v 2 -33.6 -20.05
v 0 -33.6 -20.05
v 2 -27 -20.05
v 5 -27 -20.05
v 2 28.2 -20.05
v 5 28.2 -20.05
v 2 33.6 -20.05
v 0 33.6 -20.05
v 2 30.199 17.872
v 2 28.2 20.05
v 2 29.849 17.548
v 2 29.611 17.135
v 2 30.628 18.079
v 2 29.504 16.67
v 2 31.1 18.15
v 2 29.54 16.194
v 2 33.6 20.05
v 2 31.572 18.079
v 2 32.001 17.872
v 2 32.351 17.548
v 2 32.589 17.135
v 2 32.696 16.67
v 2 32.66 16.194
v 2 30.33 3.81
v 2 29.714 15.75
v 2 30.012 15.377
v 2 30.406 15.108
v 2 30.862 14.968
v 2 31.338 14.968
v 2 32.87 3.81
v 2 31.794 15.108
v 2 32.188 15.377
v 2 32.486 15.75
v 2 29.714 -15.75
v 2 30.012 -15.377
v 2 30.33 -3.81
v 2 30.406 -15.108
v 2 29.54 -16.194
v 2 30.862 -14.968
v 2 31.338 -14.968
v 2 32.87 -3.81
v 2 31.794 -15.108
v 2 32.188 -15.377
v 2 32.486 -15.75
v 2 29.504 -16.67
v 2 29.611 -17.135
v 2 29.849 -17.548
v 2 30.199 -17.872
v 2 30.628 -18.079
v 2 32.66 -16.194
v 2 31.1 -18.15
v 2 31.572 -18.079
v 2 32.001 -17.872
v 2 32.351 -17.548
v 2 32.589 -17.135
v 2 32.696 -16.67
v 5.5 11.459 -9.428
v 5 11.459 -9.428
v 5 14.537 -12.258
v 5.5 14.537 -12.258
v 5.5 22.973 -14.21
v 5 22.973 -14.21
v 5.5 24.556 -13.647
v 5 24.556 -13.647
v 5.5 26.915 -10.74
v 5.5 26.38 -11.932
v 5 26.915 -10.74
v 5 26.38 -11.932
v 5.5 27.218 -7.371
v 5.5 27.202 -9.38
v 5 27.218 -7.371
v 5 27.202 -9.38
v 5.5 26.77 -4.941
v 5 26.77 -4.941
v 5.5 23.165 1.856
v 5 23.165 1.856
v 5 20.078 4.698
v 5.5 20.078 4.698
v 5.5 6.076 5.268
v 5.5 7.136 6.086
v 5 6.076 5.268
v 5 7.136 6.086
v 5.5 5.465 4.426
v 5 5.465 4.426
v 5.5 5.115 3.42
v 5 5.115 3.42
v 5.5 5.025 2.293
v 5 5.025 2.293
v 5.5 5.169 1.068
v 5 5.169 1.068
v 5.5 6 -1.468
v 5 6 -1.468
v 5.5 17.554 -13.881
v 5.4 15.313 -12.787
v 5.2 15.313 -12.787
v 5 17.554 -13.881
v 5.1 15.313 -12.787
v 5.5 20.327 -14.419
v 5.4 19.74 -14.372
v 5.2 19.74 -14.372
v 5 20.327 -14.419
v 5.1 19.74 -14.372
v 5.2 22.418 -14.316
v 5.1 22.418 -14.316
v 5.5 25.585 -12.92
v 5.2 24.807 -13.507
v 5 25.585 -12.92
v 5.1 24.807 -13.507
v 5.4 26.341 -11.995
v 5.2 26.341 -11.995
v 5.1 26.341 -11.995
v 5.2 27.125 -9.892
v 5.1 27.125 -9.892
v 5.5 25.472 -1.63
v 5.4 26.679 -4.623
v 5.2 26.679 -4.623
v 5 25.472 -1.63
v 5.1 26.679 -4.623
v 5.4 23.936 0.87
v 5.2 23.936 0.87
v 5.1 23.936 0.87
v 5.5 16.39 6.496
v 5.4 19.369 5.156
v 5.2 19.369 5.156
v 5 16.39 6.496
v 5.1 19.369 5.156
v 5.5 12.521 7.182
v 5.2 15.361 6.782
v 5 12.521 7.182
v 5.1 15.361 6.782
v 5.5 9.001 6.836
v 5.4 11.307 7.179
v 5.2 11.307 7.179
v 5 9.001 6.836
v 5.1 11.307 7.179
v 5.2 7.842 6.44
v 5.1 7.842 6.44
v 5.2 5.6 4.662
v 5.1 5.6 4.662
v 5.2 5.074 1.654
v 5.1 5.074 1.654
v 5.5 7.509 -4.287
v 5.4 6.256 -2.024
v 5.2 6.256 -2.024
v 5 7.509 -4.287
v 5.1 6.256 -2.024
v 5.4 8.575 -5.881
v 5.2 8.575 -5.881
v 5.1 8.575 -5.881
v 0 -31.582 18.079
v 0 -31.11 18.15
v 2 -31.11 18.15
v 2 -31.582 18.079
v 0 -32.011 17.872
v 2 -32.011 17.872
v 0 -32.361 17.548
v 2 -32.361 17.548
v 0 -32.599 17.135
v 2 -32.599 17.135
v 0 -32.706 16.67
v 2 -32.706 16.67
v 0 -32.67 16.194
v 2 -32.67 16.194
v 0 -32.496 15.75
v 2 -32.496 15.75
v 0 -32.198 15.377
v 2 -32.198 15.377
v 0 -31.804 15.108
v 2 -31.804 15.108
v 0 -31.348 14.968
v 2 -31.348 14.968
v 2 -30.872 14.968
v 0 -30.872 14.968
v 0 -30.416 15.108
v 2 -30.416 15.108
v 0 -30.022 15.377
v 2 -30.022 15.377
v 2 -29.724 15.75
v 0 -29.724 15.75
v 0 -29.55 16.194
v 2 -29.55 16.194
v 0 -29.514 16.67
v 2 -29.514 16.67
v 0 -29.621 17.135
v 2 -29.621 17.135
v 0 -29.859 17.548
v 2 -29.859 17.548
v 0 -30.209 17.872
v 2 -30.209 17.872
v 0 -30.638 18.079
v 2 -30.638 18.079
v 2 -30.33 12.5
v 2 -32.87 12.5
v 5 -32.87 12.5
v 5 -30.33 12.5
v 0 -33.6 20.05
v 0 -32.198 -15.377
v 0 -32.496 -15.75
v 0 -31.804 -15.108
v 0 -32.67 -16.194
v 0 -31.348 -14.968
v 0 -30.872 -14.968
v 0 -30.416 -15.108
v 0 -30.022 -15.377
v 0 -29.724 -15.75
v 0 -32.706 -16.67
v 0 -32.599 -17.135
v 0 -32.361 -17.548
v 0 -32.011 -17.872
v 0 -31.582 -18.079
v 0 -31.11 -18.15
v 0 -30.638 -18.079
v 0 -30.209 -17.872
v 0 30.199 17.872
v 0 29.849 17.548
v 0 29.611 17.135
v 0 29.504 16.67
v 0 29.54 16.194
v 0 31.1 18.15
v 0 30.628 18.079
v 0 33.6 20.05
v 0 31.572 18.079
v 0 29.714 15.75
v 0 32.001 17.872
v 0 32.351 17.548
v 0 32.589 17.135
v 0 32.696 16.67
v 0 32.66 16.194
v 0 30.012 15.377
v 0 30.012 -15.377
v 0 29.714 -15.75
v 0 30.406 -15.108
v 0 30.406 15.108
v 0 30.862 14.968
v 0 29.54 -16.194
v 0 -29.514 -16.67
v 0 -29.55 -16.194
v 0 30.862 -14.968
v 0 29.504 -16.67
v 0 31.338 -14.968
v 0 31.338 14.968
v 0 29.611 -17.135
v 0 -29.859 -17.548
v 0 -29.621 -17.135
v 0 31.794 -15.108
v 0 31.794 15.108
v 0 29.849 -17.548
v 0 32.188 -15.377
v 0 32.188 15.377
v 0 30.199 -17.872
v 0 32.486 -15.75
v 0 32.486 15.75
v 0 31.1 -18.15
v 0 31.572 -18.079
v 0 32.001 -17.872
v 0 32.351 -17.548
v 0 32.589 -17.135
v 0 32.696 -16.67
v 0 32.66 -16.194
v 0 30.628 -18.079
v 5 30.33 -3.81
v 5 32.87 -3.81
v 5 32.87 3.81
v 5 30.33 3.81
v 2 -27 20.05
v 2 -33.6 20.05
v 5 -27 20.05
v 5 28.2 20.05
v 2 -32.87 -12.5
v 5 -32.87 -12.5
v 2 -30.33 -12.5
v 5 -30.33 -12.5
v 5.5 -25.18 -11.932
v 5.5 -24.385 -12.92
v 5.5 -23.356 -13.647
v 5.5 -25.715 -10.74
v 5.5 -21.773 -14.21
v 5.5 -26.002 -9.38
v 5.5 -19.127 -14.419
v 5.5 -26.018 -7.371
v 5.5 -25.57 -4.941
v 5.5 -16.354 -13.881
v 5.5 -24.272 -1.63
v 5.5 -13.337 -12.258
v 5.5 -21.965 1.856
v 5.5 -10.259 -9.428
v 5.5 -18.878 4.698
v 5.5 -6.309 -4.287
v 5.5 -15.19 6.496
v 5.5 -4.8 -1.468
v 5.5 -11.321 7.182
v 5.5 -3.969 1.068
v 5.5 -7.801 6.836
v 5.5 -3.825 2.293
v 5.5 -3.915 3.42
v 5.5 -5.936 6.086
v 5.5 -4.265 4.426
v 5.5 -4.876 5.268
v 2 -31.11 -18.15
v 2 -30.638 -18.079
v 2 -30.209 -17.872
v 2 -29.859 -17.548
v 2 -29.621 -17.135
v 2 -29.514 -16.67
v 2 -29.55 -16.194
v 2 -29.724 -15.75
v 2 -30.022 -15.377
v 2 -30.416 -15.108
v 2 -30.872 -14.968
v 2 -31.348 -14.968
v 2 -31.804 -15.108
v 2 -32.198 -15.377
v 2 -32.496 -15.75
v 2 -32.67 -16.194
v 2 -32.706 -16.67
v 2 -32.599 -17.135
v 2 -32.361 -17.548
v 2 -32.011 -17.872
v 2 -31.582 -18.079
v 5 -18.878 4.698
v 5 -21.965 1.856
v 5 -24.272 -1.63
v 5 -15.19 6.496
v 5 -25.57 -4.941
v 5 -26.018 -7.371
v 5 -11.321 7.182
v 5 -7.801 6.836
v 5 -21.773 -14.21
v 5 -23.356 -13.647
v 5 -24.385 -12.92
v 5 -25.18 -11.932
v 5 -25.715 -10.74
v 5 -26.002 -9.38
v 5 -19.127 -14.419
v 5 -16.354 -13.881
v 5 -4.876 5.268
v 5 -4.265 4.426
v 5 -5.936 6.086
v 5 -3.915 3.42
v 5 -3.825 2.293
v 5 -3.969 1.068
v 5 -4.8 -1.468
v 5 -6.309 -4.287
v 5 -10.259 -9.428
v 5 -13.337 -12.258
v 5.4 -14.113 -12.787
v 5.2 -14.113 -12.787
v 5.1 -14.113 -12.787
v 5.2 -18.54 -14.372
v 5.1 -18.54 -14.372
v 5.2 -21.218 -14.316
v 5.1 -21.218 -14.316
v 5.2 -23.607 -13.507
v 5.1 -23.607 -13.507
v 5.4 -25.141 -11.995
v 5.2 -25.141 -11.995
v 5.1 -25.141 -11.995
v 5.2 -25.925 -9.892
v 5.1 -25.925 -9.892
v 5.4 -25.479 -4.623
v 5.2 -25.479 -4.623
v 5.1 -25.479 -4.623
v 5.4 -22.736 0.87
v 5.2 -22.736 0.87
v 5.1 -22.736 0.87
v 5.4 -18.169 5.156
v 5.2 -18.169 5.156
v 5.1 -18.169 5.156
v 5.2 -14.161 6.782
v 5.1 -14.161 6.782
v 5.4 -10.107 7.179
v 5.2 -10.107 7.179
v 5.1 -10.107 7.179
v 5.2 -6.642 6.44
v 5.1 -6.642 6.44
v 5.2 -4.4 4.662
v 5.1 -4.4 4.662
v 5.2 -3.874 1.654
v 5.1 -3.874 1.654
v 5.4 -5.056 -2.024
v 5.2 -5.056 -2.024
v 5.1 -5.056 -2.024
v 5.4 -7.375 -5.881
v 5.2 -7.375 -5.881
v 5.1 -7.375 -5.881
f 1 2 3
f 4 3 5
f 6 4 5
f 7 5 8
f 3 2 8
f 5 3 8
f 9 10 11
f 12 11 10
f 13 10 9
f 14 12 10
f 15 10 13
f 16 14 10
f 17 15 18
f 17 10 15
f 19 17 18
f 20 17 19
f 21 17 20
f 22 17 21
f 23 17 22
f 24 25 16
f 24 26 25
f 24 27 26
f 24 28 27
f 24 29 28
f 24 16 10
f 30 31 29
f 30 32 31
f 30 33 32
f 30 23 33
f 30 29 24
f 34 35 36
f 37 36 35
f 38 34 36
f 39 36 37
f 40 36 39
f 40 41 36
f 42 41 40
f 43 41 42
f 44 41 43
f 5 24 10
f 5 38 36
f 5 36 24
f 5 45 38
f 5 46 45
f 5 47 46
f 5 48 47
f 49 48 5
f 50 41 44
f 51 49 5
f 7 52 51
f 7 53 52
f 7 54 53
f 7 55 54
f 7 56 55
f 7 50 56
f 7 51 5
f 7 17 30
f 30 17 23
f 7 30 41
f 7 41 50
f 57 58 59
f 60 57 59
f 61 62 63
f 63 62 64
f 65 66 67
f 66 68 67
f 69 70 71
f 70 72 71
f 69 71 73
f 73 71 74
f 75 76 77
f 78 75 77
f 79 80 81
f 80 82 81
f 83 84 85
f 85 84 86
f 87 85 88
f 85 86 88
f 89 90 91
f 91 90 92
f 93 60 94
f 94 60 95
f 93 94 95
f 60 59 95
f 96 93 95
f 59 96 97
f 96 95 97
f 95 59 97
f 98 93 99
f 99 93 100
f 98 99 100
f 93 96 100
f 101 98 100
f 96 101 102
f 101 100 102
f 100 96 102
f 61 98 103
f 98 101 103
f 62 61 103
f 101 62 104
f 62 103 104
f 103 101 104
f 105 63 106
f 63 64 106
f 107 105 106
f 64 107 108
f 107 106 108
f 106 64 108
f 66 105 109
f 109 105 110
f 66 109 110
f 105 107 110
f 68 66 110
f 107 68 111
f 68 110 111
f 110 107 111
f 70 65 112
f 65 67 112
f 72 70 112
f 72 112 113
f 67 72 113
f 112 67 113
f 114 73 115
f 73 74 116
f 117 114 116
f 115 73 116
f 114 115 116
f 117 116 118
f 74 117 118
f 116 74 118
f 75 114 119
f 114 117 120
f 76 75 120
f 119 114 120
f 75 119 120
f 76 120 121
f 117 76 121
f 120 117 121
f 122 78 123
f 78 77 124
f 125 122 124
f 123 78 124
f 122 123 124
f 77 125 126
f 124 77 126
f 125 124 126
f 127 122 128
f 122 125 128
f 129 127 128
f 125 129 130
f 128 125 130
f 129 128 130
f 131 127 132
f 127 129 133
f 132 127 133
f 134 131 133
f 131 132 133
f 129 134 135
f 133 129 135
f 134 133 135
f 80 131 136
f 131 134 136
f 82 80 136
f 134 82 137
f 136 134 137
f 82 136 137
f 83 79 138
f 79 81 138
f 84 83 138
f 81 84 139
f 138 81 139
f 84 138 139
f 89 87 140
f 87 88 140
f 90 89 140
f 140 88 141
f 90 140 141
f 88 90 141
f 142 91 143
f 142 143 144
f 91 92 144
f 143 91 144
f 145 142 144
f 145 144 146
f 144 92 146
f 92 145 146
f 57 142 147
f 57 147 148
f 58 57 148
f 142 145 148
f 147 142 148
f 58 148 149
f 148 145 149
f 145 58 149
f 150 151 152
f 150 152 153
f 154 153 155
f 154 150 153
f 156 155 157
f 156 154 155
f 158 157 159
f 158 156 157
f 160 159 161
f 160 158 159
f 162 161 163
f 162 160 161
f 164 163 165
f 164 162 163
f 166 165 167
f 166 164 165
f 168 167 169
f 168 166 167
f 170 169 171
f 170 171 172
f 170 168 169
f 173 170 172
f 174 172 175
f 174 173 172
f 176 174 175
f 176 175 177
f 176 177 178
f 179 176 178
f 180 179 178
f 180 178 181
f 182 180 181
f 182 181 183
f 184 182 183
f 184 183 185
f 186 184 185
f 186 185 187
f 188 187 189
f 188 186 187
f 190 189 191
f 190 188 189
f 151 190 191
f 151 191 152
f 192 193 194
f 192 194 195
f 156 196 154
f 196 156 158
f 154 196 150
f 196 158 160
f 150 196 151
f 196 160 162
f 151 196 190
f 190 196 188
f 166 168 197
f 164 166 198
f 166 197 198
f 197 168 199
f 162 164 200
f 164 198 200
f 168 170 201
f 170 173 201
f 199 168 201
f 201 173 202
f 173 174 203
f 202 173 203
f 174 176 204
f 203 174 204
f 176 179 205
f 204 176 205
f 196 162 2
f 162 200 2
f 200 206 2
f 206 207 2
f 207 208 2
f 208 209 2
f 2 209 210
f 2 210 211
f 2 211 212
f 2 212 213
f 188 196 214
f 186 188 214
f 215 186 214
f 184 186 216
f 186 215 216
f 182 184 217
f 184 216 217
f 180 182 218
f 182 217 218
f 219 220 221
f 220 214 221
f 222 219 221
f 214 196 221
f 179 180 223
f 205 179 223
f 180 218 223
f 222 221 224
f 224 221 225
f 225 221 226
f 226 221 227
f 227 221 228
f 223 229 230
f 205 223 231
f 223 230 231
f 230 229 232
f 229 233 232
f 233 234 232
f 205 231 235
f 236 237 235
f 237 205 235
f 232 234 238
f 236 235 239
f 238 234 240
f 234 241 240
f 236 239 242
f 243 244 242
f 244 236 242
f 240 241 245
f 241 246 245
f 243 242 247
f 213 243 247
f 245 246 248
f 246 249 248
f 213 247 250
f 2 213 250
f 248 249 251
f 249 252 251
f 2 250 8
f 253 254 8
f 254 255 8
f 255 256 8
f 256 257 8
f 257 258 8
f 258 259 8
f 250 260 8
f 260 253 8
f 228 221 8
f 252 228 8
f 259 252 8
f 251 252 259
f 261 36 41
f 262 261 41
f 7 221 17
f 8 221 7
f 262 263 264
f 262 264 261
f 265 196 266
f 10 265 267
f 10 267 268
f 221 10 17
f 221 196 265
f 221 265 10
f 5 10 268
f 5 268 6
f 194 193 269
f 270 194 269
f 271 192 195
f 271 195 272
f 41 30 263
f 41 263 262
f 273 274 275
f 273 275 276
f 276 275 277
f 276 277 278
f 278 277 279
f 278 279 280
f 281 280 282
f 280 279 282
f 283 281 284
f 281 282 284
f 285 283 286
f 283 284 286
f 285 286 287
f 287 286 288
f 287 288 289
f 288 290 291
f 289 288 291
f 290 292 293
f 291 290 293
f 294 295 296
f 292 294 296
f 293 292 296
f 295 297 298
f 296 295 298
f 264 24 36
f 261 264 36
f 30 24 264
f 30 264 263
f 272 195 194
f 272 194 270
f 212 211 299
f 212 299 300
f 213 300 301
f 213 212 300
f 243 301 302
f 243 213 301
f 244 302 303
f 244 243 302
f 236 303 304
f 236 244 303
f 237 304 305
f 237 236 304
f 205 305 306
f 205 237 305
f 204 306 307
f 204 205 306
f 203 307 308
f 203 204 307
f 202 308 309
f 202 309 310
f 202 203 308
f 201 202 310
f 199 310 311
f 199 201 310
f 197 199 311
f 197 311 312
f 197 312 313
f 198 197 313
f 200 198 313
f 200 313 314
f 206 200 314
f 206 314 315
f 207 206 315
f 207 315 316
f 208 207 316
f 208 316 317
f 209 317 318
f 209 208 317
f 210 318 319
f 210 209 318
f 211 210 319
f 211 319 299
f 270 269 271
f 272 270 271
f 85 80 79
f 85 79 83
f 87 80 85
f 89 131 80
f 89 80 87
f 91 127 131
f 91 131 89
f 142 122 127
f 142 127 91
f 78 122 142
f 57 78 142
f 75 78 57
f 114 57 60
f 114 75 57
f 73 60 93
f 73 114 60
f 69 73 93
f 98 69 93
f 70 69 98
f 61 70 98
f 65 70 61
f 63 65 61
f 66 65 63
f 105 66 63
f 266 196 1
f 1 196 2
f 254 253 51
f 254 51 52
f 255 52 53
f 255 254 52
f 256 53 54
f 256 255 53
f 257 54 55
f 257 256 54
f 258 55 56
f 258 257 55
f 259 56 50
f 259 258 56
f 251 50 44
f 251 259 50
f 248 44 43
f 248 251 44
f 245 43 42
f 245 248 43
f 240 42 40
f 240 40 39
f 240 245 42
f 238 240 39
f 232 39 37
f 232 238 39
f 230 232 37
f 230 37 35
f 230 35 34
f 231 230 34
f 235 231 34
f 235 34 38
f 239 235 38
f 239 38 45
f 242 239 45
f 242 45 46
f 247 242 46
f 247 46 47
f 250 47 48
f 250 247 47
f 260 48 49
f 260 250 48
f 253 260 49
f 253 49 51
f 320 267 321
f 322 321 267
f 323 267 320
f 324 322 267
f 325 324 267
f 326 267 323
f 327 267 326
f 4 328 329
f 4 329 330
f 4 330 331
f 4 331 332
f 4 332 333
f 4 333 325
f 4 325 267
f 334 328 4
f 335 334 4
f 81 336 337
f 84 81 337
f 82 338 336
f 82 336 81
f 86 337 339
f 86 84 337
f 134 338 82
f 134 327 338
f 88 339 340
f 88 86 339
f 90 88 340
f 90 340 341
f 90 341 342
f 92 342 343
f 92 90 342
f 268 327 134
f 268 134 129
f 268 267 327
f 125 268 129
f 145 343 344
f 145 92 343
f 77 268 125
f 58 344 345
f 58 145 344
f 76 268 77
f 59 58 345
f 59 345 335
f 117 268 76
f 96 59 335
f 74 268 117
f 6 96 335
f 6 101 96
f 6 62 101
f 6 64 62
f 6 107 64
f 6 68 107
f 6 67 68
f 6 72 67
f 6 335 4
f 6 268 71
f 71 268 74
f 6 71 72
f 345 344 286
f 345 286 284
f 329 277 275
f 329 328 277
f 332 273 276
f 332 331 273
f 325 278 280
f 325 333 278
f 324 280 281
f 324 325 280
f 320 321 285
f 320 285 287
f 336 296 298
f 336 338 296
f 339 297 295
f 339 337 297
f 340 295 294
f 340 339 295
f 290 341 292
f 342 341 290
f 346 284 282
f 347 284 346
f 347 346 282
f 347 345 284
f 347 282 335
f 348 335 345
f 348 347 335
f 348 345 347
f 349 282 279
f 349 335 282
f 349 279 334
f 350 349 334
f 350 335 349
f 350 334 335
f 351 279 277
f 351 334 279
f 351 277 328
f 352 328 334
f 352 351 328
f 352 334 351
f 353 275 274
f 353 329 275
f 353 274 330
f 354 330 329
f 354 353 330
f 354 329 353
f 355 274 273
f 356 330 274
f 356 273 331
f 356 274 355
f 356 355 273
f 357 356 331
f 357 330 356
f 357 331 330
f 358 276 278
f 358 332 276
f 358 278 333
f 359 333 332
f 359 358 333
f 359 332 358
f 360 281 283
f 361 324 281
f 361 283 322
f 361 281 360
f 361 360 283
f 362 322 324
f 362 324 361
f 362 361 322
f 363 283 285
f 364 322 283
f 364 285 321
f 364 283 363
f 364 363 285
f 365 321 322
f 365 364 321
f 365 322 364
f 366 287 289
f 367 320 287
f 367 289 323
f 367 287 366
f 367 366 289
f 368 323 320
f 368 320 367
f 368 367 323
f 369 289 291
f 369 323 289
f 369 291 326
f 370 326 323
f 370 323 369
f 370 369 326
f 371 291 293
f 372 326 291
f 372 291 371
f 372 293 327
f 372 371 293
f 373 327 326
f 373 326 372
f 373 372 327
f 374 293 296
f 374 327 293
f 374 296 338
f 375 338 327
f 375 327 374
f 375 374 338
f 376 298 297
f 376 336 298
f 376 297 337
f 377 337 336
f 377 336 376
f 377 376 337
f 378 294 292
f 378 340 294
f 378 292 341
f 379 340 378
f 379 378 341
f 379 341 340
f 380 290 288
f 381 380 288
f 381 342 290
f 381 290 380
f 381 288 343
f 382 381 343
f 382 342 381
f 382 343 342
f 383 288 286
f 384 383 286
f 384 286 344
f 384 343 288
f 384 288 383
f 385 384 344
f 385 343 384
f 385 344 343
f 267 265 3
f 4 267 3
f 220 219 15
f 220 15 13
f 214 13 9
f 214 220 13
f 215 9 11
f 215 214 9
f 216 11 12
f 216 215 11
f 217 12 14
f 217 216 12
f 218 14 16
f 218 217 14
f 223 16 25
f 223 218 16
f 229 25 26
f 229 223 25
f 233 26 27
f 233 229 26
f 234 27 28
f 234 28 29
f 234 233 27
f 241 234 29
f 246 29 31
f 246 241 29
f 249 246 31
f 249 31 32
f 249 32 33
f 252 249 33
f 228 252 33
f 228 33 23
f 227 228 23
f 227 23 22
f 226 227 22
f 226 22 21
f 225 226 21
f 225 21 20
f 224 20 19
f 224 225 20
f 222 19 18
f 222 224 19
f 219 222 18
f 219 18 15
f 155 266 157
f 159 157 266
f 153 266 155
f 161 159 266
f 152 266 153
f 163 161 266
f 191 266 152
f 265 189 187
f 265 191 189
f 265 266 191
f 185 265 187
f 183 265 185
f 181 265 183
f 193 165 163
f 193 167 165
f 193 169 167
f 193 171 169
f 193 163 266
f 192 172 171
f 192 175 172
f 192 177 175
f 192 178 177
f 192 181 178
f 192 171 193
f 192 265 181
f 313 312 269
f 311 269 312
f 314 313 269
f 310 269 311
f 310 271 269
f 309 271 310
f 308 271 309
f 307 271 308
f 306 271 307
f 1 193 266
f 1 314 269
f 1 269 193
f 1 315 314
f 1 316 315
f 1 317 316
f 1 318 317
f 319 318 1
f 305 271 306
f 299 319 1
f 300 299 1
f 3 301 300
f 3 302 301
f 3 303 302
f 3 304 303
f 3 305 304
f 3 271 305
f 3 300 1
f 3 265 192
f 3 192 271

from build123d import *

# Parameters (mm, degrees)
SKETCH1_W           = 40.1
SKETCH1_H           = 67.2
SKETCH1_R           = 1.6
BOSS_EXTRUDE1_DEPTH = 2
SKETCH2_W           = 40.1
SKETCH2_H           = 55.2
SKETCH2_W_2         = 25
SKETCH2_H_2         = 2.54
SKETCH2_W_3         = 7.62
BOSS_EXTRUDE2_DEPTH = 3
BOSS_EXTRUDE3_DEPTH = 0.5


with BuildPart() as part:
    # Sketch1 → Boss-Extrude1 (new body)
    with BuildSketch(Plane(origin=(0, 0, 0), x_dir=(0, 0, -1), z_dir=(1, 0, 0))):
        Rectangle(SKETCH1_W, SKETCH1_H)
        with Locations((16.55, 31.1)):
            Circle(SKETCH1_R, mode=Mode.SUBTRACT)
        with Locations((16.55, -31.11)):
            Circle(SKETCH1_R, mode=Mode.SUBTRACT)
        with Locations(Location((-16.55, -31.11, 0), (0, 0, 180))):
            Circle(SKETCH1_R, mode=Mode.SUBTRACT)
        with Locations(Location((-16.55, 31.1, 0), (0, 0, 180))):
            Circle(SKETCH1_R, mode=Mode.SUBTRACT)
    extrude(amount=BOSS_EXTRUDE1_DEPTH)

    # Sketch2 → Boss-Extrude2 (add)
    with BuildSketch(Plane(origin=(2, 0, 0), x_dir=(0, 0, -1), z_dir=(1, 0, 0))):
        with Locations((0, 0.6)):
            Rectangle(SKETCH2_W, SKETCH2_H)
        with Locations((0, -31.6)):
            Rectangle(SKETCH2_W_2, SKETCH2_H_2)
        with Locations((0, 31.6)):
            Rectangle(SKETCH2_W_3, SKETCH2_H_2)
    extrude(amount=BOSS_EXTRUDE2_DEPTH)

    # Sketch3 → Boss-Extrude3 (add)
    with BuildSketch(Plane(origin=(5, 0, 0), x_dir=(0, 0, -1), z_dir=(1, 0, 0))):
        with BuildLine():
            add(Edge.make_bspline(
                [(9.428160808, -10.258647158), (12.148533605, -12.766508078), (15.01174655, -16.60061625), (13.414973779, -29.671171948), (-8.894779227, -22.798689467), (-7.128189514, 1.292467688), (5.124002127, -6.290723583), (9.428160808, -10.258647158)],
                knots=[0, 0, 0, 0, 0.152454057, 0.233716346, 0.541000039, 0.75878804, 1, 1, 1, 1], degree=3))
        make_face()
        with BuildLine():
            add(Edge.make_bspline(
                [(9.428160808, 11.458647158), (12.148533605, 13.966508078), (15.01174655, 17.80061625), (13.414973779, 30.871171948), (-8.894779227, 23.998689467), (-7.128189514, -0.092467688), (5.124002127, 7.490723583), (9.428160808, 11.458647158)],
                knots=[0, 0, 0, 0, 0.152454057, 0.233716346, 0.541000039, 0.75878804, 1, 1, 1, 1], degree=3))
        make_face()
    extrude(amount=BOSS_EXTRUDE3_DEPTH)


solid = part.part
